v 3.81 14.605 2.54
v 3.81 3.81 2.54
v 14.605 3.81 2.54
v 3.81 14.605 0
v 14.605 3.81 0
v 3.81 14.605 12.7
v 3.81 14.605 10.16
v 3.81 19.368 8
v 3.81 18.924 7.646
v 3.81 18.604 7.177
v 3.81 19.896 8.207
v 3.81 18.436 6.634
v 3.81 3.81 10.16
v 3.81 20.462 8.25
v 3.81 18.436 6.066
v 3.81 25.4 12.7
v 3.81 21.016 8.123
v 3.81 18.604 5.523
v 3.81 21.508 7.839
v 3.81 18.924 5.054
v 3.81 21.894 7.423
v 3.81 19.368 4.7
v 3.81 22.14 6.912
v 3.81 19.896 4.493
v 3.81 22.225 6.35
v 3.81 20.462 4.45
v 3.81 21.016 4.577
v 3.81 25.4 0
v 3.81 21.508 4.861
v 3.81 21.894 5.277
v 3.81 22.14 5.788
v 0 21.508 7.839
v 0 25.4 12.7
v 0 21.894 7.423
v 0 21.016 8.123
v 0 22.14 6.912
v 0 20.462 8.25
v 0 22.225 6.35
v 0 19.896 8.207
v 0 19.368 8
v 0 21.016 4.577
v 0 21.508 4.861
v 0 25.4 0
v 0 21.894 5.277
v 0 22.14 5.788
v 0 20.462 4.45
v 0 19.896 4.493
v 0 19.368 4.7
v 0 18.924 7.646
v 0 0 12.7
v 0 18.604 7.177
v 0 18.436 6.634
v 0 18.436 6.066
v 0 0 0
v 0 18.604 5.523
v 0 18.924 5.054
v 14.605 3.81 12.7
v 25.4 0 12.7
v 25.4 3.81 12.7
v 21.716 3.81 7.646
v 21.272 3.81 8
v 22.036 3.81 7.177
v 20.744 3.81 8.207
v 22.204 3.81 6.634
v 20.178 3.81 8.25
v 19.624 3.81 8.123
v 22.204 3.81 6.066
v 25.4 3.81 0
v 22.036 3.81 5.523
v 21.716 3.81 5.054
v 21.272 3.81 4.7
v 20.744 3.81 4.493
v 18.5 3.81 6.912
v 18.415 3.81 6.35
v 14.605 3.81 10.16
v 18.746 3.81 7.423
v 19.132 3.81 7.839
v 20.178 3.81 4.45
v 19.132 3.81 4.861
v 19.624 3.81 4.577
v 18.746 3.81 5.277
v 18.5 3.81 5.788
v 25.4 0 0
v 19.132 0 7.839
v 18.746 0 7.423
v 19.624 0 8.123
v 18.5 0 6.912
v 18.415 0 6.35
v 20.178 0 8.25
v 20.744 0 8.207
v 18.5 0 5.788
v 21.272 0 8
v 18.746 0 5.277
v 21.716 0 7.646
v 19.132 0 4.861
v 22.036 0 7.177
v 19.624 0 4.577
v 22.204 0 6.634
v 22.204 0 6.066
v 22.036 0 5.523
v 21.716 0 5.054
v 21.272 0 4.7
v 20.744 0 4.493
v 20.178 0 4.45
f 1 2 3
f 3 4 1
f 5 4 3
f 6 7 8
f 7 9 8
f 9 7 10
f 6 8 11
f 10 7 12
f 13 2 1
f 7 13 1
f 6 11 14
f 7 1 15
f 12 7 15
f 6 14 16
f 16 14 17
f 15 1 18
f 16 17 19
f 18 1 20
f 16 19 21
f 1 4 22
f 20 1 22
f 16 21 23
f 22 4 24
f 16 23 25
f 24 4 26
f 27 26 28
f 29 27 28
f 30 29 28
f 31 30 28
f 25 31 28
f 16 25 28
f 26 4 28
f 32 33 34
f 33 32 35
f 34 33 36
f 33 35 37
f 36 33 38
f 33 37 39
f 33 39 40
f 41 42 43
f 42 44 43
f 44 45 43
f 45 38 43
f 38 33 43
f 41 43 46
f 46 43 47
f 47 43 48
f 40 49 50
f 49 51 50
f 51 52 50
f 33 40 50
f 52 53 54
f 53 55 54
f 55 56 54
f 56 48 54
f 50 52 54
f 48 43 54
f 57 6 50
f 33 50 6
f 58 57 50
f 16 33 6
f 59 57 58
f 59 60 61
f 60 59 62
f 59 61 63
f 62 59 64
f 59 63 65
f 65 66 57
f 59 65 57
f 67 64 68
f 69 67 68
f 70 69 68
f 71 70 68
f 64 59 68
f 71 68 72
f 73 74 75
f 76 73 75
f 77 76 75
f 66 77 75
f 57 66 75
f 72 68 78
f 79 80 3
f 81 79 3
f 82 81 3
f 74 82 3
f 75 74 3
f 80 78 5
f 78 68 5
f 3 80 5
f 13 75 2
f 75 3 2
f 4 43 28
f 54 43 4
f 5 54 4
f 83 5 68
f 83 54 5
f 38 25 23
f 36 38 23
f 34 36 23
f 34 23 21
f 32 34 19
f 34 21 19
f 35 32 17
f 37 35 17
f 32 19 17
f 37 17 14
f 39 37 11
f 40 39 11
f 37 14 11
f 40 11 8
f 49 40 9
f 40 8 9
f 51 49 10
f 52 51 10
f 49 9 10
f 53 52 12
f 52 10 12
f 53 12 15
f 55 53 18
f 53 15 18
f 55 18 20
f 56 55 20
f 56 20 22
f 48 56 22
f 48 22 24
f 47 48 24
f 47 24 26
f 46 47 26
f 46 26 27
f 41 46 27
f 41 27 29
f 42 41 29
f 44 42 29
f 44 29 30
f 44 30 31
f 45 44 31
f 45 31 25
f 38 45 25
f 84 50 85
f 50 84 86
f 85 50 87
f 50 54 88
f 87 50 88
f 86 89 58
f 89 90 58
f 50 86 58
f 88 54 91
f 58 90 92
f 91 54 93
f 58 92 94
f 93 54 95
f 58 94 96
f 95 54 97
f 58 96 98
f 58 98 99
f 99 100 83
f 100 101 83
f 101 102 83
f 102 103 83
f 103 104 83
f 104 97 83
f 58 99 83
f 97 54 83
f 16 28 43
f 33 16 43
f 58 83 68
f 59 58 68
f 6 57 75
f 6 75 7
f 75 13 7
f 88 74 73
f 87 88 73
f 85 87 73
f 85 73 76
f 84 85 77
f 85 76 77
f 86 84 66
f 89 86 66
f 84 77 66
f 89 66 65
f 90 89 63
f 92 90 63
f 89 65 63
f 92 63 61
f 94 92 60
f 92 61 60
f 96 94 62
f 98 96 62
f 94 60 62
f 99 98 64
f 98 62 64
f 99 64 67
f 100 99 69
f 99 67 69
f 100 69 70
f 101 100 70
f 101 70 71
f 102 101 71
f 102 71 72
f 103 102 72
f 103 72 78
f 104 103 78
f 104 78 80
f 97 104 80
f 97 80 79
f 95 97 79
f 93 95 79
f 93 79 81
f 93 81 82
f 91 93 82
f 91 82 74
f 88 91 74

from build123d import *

# Parameters (mm, degrees)
F1_DEPTH  = 12.7
F4_DEPTH  = 2.54
F6_R      = 1.905
F7_DEPTH  = 25.4
F8_DEPTH  = 2.54
F9_R      = 1.905
F10_DEPTH = 25.4


with BuildPart() as f1:
    # F0 (on Top) → F1 (new body)
    with BuildSketch(Plane.XY):
        Polygon((0, 25.4), (0, 0), (25.4, 0), (25.4, 3.81), (3.81, 3.81), (3.81, 25.4), align=None)
    extrude(amount=F1_DEPTH)

    # F2 (on face) → F4 (join)
    with BuildSketch(Plane.XY.offset(12.7)):
        Polygon((14.605, 3.81), (3.81, 14.605), (3.81, 3.81), align=None)
    extrude(amount=-F4_DEPTH)

    # F6 (on face) → F7 (cut)
    with BuildSketch(Plane.YZ.offset(3.81)):
        with Locations((20.32, 6.35)):
            Circle(F6_R)
    extrude(amount=-F7_DEPTH, mode=Mode.SUBTRACT)

    # F5 (on face) → F8 (join)
    with BuildSketch(Plane(origin=(0, 0, 0), x_dir=(1, 0, 0), z_dir=(0, 0, -1))):
        Polygon((3.81, -14.605), (14.605, -3.81), (3.81, -3.81), align=None)
    extrude(amount=-F8_DEPTH)

    # F9 (on face) → F10 (cut)
    with BuildSketch(Plane(origin=(0, 3.81, 0), x_dir=(-1, 0, 0), z_dir=(0, 1, 0))):
        with Locations((-20.32, 6.35)):
            Circle(F9_R)
    extrude(amount=-F10_DEPTH, mode=Mode.SUBTRACT)


solid = f1.part
